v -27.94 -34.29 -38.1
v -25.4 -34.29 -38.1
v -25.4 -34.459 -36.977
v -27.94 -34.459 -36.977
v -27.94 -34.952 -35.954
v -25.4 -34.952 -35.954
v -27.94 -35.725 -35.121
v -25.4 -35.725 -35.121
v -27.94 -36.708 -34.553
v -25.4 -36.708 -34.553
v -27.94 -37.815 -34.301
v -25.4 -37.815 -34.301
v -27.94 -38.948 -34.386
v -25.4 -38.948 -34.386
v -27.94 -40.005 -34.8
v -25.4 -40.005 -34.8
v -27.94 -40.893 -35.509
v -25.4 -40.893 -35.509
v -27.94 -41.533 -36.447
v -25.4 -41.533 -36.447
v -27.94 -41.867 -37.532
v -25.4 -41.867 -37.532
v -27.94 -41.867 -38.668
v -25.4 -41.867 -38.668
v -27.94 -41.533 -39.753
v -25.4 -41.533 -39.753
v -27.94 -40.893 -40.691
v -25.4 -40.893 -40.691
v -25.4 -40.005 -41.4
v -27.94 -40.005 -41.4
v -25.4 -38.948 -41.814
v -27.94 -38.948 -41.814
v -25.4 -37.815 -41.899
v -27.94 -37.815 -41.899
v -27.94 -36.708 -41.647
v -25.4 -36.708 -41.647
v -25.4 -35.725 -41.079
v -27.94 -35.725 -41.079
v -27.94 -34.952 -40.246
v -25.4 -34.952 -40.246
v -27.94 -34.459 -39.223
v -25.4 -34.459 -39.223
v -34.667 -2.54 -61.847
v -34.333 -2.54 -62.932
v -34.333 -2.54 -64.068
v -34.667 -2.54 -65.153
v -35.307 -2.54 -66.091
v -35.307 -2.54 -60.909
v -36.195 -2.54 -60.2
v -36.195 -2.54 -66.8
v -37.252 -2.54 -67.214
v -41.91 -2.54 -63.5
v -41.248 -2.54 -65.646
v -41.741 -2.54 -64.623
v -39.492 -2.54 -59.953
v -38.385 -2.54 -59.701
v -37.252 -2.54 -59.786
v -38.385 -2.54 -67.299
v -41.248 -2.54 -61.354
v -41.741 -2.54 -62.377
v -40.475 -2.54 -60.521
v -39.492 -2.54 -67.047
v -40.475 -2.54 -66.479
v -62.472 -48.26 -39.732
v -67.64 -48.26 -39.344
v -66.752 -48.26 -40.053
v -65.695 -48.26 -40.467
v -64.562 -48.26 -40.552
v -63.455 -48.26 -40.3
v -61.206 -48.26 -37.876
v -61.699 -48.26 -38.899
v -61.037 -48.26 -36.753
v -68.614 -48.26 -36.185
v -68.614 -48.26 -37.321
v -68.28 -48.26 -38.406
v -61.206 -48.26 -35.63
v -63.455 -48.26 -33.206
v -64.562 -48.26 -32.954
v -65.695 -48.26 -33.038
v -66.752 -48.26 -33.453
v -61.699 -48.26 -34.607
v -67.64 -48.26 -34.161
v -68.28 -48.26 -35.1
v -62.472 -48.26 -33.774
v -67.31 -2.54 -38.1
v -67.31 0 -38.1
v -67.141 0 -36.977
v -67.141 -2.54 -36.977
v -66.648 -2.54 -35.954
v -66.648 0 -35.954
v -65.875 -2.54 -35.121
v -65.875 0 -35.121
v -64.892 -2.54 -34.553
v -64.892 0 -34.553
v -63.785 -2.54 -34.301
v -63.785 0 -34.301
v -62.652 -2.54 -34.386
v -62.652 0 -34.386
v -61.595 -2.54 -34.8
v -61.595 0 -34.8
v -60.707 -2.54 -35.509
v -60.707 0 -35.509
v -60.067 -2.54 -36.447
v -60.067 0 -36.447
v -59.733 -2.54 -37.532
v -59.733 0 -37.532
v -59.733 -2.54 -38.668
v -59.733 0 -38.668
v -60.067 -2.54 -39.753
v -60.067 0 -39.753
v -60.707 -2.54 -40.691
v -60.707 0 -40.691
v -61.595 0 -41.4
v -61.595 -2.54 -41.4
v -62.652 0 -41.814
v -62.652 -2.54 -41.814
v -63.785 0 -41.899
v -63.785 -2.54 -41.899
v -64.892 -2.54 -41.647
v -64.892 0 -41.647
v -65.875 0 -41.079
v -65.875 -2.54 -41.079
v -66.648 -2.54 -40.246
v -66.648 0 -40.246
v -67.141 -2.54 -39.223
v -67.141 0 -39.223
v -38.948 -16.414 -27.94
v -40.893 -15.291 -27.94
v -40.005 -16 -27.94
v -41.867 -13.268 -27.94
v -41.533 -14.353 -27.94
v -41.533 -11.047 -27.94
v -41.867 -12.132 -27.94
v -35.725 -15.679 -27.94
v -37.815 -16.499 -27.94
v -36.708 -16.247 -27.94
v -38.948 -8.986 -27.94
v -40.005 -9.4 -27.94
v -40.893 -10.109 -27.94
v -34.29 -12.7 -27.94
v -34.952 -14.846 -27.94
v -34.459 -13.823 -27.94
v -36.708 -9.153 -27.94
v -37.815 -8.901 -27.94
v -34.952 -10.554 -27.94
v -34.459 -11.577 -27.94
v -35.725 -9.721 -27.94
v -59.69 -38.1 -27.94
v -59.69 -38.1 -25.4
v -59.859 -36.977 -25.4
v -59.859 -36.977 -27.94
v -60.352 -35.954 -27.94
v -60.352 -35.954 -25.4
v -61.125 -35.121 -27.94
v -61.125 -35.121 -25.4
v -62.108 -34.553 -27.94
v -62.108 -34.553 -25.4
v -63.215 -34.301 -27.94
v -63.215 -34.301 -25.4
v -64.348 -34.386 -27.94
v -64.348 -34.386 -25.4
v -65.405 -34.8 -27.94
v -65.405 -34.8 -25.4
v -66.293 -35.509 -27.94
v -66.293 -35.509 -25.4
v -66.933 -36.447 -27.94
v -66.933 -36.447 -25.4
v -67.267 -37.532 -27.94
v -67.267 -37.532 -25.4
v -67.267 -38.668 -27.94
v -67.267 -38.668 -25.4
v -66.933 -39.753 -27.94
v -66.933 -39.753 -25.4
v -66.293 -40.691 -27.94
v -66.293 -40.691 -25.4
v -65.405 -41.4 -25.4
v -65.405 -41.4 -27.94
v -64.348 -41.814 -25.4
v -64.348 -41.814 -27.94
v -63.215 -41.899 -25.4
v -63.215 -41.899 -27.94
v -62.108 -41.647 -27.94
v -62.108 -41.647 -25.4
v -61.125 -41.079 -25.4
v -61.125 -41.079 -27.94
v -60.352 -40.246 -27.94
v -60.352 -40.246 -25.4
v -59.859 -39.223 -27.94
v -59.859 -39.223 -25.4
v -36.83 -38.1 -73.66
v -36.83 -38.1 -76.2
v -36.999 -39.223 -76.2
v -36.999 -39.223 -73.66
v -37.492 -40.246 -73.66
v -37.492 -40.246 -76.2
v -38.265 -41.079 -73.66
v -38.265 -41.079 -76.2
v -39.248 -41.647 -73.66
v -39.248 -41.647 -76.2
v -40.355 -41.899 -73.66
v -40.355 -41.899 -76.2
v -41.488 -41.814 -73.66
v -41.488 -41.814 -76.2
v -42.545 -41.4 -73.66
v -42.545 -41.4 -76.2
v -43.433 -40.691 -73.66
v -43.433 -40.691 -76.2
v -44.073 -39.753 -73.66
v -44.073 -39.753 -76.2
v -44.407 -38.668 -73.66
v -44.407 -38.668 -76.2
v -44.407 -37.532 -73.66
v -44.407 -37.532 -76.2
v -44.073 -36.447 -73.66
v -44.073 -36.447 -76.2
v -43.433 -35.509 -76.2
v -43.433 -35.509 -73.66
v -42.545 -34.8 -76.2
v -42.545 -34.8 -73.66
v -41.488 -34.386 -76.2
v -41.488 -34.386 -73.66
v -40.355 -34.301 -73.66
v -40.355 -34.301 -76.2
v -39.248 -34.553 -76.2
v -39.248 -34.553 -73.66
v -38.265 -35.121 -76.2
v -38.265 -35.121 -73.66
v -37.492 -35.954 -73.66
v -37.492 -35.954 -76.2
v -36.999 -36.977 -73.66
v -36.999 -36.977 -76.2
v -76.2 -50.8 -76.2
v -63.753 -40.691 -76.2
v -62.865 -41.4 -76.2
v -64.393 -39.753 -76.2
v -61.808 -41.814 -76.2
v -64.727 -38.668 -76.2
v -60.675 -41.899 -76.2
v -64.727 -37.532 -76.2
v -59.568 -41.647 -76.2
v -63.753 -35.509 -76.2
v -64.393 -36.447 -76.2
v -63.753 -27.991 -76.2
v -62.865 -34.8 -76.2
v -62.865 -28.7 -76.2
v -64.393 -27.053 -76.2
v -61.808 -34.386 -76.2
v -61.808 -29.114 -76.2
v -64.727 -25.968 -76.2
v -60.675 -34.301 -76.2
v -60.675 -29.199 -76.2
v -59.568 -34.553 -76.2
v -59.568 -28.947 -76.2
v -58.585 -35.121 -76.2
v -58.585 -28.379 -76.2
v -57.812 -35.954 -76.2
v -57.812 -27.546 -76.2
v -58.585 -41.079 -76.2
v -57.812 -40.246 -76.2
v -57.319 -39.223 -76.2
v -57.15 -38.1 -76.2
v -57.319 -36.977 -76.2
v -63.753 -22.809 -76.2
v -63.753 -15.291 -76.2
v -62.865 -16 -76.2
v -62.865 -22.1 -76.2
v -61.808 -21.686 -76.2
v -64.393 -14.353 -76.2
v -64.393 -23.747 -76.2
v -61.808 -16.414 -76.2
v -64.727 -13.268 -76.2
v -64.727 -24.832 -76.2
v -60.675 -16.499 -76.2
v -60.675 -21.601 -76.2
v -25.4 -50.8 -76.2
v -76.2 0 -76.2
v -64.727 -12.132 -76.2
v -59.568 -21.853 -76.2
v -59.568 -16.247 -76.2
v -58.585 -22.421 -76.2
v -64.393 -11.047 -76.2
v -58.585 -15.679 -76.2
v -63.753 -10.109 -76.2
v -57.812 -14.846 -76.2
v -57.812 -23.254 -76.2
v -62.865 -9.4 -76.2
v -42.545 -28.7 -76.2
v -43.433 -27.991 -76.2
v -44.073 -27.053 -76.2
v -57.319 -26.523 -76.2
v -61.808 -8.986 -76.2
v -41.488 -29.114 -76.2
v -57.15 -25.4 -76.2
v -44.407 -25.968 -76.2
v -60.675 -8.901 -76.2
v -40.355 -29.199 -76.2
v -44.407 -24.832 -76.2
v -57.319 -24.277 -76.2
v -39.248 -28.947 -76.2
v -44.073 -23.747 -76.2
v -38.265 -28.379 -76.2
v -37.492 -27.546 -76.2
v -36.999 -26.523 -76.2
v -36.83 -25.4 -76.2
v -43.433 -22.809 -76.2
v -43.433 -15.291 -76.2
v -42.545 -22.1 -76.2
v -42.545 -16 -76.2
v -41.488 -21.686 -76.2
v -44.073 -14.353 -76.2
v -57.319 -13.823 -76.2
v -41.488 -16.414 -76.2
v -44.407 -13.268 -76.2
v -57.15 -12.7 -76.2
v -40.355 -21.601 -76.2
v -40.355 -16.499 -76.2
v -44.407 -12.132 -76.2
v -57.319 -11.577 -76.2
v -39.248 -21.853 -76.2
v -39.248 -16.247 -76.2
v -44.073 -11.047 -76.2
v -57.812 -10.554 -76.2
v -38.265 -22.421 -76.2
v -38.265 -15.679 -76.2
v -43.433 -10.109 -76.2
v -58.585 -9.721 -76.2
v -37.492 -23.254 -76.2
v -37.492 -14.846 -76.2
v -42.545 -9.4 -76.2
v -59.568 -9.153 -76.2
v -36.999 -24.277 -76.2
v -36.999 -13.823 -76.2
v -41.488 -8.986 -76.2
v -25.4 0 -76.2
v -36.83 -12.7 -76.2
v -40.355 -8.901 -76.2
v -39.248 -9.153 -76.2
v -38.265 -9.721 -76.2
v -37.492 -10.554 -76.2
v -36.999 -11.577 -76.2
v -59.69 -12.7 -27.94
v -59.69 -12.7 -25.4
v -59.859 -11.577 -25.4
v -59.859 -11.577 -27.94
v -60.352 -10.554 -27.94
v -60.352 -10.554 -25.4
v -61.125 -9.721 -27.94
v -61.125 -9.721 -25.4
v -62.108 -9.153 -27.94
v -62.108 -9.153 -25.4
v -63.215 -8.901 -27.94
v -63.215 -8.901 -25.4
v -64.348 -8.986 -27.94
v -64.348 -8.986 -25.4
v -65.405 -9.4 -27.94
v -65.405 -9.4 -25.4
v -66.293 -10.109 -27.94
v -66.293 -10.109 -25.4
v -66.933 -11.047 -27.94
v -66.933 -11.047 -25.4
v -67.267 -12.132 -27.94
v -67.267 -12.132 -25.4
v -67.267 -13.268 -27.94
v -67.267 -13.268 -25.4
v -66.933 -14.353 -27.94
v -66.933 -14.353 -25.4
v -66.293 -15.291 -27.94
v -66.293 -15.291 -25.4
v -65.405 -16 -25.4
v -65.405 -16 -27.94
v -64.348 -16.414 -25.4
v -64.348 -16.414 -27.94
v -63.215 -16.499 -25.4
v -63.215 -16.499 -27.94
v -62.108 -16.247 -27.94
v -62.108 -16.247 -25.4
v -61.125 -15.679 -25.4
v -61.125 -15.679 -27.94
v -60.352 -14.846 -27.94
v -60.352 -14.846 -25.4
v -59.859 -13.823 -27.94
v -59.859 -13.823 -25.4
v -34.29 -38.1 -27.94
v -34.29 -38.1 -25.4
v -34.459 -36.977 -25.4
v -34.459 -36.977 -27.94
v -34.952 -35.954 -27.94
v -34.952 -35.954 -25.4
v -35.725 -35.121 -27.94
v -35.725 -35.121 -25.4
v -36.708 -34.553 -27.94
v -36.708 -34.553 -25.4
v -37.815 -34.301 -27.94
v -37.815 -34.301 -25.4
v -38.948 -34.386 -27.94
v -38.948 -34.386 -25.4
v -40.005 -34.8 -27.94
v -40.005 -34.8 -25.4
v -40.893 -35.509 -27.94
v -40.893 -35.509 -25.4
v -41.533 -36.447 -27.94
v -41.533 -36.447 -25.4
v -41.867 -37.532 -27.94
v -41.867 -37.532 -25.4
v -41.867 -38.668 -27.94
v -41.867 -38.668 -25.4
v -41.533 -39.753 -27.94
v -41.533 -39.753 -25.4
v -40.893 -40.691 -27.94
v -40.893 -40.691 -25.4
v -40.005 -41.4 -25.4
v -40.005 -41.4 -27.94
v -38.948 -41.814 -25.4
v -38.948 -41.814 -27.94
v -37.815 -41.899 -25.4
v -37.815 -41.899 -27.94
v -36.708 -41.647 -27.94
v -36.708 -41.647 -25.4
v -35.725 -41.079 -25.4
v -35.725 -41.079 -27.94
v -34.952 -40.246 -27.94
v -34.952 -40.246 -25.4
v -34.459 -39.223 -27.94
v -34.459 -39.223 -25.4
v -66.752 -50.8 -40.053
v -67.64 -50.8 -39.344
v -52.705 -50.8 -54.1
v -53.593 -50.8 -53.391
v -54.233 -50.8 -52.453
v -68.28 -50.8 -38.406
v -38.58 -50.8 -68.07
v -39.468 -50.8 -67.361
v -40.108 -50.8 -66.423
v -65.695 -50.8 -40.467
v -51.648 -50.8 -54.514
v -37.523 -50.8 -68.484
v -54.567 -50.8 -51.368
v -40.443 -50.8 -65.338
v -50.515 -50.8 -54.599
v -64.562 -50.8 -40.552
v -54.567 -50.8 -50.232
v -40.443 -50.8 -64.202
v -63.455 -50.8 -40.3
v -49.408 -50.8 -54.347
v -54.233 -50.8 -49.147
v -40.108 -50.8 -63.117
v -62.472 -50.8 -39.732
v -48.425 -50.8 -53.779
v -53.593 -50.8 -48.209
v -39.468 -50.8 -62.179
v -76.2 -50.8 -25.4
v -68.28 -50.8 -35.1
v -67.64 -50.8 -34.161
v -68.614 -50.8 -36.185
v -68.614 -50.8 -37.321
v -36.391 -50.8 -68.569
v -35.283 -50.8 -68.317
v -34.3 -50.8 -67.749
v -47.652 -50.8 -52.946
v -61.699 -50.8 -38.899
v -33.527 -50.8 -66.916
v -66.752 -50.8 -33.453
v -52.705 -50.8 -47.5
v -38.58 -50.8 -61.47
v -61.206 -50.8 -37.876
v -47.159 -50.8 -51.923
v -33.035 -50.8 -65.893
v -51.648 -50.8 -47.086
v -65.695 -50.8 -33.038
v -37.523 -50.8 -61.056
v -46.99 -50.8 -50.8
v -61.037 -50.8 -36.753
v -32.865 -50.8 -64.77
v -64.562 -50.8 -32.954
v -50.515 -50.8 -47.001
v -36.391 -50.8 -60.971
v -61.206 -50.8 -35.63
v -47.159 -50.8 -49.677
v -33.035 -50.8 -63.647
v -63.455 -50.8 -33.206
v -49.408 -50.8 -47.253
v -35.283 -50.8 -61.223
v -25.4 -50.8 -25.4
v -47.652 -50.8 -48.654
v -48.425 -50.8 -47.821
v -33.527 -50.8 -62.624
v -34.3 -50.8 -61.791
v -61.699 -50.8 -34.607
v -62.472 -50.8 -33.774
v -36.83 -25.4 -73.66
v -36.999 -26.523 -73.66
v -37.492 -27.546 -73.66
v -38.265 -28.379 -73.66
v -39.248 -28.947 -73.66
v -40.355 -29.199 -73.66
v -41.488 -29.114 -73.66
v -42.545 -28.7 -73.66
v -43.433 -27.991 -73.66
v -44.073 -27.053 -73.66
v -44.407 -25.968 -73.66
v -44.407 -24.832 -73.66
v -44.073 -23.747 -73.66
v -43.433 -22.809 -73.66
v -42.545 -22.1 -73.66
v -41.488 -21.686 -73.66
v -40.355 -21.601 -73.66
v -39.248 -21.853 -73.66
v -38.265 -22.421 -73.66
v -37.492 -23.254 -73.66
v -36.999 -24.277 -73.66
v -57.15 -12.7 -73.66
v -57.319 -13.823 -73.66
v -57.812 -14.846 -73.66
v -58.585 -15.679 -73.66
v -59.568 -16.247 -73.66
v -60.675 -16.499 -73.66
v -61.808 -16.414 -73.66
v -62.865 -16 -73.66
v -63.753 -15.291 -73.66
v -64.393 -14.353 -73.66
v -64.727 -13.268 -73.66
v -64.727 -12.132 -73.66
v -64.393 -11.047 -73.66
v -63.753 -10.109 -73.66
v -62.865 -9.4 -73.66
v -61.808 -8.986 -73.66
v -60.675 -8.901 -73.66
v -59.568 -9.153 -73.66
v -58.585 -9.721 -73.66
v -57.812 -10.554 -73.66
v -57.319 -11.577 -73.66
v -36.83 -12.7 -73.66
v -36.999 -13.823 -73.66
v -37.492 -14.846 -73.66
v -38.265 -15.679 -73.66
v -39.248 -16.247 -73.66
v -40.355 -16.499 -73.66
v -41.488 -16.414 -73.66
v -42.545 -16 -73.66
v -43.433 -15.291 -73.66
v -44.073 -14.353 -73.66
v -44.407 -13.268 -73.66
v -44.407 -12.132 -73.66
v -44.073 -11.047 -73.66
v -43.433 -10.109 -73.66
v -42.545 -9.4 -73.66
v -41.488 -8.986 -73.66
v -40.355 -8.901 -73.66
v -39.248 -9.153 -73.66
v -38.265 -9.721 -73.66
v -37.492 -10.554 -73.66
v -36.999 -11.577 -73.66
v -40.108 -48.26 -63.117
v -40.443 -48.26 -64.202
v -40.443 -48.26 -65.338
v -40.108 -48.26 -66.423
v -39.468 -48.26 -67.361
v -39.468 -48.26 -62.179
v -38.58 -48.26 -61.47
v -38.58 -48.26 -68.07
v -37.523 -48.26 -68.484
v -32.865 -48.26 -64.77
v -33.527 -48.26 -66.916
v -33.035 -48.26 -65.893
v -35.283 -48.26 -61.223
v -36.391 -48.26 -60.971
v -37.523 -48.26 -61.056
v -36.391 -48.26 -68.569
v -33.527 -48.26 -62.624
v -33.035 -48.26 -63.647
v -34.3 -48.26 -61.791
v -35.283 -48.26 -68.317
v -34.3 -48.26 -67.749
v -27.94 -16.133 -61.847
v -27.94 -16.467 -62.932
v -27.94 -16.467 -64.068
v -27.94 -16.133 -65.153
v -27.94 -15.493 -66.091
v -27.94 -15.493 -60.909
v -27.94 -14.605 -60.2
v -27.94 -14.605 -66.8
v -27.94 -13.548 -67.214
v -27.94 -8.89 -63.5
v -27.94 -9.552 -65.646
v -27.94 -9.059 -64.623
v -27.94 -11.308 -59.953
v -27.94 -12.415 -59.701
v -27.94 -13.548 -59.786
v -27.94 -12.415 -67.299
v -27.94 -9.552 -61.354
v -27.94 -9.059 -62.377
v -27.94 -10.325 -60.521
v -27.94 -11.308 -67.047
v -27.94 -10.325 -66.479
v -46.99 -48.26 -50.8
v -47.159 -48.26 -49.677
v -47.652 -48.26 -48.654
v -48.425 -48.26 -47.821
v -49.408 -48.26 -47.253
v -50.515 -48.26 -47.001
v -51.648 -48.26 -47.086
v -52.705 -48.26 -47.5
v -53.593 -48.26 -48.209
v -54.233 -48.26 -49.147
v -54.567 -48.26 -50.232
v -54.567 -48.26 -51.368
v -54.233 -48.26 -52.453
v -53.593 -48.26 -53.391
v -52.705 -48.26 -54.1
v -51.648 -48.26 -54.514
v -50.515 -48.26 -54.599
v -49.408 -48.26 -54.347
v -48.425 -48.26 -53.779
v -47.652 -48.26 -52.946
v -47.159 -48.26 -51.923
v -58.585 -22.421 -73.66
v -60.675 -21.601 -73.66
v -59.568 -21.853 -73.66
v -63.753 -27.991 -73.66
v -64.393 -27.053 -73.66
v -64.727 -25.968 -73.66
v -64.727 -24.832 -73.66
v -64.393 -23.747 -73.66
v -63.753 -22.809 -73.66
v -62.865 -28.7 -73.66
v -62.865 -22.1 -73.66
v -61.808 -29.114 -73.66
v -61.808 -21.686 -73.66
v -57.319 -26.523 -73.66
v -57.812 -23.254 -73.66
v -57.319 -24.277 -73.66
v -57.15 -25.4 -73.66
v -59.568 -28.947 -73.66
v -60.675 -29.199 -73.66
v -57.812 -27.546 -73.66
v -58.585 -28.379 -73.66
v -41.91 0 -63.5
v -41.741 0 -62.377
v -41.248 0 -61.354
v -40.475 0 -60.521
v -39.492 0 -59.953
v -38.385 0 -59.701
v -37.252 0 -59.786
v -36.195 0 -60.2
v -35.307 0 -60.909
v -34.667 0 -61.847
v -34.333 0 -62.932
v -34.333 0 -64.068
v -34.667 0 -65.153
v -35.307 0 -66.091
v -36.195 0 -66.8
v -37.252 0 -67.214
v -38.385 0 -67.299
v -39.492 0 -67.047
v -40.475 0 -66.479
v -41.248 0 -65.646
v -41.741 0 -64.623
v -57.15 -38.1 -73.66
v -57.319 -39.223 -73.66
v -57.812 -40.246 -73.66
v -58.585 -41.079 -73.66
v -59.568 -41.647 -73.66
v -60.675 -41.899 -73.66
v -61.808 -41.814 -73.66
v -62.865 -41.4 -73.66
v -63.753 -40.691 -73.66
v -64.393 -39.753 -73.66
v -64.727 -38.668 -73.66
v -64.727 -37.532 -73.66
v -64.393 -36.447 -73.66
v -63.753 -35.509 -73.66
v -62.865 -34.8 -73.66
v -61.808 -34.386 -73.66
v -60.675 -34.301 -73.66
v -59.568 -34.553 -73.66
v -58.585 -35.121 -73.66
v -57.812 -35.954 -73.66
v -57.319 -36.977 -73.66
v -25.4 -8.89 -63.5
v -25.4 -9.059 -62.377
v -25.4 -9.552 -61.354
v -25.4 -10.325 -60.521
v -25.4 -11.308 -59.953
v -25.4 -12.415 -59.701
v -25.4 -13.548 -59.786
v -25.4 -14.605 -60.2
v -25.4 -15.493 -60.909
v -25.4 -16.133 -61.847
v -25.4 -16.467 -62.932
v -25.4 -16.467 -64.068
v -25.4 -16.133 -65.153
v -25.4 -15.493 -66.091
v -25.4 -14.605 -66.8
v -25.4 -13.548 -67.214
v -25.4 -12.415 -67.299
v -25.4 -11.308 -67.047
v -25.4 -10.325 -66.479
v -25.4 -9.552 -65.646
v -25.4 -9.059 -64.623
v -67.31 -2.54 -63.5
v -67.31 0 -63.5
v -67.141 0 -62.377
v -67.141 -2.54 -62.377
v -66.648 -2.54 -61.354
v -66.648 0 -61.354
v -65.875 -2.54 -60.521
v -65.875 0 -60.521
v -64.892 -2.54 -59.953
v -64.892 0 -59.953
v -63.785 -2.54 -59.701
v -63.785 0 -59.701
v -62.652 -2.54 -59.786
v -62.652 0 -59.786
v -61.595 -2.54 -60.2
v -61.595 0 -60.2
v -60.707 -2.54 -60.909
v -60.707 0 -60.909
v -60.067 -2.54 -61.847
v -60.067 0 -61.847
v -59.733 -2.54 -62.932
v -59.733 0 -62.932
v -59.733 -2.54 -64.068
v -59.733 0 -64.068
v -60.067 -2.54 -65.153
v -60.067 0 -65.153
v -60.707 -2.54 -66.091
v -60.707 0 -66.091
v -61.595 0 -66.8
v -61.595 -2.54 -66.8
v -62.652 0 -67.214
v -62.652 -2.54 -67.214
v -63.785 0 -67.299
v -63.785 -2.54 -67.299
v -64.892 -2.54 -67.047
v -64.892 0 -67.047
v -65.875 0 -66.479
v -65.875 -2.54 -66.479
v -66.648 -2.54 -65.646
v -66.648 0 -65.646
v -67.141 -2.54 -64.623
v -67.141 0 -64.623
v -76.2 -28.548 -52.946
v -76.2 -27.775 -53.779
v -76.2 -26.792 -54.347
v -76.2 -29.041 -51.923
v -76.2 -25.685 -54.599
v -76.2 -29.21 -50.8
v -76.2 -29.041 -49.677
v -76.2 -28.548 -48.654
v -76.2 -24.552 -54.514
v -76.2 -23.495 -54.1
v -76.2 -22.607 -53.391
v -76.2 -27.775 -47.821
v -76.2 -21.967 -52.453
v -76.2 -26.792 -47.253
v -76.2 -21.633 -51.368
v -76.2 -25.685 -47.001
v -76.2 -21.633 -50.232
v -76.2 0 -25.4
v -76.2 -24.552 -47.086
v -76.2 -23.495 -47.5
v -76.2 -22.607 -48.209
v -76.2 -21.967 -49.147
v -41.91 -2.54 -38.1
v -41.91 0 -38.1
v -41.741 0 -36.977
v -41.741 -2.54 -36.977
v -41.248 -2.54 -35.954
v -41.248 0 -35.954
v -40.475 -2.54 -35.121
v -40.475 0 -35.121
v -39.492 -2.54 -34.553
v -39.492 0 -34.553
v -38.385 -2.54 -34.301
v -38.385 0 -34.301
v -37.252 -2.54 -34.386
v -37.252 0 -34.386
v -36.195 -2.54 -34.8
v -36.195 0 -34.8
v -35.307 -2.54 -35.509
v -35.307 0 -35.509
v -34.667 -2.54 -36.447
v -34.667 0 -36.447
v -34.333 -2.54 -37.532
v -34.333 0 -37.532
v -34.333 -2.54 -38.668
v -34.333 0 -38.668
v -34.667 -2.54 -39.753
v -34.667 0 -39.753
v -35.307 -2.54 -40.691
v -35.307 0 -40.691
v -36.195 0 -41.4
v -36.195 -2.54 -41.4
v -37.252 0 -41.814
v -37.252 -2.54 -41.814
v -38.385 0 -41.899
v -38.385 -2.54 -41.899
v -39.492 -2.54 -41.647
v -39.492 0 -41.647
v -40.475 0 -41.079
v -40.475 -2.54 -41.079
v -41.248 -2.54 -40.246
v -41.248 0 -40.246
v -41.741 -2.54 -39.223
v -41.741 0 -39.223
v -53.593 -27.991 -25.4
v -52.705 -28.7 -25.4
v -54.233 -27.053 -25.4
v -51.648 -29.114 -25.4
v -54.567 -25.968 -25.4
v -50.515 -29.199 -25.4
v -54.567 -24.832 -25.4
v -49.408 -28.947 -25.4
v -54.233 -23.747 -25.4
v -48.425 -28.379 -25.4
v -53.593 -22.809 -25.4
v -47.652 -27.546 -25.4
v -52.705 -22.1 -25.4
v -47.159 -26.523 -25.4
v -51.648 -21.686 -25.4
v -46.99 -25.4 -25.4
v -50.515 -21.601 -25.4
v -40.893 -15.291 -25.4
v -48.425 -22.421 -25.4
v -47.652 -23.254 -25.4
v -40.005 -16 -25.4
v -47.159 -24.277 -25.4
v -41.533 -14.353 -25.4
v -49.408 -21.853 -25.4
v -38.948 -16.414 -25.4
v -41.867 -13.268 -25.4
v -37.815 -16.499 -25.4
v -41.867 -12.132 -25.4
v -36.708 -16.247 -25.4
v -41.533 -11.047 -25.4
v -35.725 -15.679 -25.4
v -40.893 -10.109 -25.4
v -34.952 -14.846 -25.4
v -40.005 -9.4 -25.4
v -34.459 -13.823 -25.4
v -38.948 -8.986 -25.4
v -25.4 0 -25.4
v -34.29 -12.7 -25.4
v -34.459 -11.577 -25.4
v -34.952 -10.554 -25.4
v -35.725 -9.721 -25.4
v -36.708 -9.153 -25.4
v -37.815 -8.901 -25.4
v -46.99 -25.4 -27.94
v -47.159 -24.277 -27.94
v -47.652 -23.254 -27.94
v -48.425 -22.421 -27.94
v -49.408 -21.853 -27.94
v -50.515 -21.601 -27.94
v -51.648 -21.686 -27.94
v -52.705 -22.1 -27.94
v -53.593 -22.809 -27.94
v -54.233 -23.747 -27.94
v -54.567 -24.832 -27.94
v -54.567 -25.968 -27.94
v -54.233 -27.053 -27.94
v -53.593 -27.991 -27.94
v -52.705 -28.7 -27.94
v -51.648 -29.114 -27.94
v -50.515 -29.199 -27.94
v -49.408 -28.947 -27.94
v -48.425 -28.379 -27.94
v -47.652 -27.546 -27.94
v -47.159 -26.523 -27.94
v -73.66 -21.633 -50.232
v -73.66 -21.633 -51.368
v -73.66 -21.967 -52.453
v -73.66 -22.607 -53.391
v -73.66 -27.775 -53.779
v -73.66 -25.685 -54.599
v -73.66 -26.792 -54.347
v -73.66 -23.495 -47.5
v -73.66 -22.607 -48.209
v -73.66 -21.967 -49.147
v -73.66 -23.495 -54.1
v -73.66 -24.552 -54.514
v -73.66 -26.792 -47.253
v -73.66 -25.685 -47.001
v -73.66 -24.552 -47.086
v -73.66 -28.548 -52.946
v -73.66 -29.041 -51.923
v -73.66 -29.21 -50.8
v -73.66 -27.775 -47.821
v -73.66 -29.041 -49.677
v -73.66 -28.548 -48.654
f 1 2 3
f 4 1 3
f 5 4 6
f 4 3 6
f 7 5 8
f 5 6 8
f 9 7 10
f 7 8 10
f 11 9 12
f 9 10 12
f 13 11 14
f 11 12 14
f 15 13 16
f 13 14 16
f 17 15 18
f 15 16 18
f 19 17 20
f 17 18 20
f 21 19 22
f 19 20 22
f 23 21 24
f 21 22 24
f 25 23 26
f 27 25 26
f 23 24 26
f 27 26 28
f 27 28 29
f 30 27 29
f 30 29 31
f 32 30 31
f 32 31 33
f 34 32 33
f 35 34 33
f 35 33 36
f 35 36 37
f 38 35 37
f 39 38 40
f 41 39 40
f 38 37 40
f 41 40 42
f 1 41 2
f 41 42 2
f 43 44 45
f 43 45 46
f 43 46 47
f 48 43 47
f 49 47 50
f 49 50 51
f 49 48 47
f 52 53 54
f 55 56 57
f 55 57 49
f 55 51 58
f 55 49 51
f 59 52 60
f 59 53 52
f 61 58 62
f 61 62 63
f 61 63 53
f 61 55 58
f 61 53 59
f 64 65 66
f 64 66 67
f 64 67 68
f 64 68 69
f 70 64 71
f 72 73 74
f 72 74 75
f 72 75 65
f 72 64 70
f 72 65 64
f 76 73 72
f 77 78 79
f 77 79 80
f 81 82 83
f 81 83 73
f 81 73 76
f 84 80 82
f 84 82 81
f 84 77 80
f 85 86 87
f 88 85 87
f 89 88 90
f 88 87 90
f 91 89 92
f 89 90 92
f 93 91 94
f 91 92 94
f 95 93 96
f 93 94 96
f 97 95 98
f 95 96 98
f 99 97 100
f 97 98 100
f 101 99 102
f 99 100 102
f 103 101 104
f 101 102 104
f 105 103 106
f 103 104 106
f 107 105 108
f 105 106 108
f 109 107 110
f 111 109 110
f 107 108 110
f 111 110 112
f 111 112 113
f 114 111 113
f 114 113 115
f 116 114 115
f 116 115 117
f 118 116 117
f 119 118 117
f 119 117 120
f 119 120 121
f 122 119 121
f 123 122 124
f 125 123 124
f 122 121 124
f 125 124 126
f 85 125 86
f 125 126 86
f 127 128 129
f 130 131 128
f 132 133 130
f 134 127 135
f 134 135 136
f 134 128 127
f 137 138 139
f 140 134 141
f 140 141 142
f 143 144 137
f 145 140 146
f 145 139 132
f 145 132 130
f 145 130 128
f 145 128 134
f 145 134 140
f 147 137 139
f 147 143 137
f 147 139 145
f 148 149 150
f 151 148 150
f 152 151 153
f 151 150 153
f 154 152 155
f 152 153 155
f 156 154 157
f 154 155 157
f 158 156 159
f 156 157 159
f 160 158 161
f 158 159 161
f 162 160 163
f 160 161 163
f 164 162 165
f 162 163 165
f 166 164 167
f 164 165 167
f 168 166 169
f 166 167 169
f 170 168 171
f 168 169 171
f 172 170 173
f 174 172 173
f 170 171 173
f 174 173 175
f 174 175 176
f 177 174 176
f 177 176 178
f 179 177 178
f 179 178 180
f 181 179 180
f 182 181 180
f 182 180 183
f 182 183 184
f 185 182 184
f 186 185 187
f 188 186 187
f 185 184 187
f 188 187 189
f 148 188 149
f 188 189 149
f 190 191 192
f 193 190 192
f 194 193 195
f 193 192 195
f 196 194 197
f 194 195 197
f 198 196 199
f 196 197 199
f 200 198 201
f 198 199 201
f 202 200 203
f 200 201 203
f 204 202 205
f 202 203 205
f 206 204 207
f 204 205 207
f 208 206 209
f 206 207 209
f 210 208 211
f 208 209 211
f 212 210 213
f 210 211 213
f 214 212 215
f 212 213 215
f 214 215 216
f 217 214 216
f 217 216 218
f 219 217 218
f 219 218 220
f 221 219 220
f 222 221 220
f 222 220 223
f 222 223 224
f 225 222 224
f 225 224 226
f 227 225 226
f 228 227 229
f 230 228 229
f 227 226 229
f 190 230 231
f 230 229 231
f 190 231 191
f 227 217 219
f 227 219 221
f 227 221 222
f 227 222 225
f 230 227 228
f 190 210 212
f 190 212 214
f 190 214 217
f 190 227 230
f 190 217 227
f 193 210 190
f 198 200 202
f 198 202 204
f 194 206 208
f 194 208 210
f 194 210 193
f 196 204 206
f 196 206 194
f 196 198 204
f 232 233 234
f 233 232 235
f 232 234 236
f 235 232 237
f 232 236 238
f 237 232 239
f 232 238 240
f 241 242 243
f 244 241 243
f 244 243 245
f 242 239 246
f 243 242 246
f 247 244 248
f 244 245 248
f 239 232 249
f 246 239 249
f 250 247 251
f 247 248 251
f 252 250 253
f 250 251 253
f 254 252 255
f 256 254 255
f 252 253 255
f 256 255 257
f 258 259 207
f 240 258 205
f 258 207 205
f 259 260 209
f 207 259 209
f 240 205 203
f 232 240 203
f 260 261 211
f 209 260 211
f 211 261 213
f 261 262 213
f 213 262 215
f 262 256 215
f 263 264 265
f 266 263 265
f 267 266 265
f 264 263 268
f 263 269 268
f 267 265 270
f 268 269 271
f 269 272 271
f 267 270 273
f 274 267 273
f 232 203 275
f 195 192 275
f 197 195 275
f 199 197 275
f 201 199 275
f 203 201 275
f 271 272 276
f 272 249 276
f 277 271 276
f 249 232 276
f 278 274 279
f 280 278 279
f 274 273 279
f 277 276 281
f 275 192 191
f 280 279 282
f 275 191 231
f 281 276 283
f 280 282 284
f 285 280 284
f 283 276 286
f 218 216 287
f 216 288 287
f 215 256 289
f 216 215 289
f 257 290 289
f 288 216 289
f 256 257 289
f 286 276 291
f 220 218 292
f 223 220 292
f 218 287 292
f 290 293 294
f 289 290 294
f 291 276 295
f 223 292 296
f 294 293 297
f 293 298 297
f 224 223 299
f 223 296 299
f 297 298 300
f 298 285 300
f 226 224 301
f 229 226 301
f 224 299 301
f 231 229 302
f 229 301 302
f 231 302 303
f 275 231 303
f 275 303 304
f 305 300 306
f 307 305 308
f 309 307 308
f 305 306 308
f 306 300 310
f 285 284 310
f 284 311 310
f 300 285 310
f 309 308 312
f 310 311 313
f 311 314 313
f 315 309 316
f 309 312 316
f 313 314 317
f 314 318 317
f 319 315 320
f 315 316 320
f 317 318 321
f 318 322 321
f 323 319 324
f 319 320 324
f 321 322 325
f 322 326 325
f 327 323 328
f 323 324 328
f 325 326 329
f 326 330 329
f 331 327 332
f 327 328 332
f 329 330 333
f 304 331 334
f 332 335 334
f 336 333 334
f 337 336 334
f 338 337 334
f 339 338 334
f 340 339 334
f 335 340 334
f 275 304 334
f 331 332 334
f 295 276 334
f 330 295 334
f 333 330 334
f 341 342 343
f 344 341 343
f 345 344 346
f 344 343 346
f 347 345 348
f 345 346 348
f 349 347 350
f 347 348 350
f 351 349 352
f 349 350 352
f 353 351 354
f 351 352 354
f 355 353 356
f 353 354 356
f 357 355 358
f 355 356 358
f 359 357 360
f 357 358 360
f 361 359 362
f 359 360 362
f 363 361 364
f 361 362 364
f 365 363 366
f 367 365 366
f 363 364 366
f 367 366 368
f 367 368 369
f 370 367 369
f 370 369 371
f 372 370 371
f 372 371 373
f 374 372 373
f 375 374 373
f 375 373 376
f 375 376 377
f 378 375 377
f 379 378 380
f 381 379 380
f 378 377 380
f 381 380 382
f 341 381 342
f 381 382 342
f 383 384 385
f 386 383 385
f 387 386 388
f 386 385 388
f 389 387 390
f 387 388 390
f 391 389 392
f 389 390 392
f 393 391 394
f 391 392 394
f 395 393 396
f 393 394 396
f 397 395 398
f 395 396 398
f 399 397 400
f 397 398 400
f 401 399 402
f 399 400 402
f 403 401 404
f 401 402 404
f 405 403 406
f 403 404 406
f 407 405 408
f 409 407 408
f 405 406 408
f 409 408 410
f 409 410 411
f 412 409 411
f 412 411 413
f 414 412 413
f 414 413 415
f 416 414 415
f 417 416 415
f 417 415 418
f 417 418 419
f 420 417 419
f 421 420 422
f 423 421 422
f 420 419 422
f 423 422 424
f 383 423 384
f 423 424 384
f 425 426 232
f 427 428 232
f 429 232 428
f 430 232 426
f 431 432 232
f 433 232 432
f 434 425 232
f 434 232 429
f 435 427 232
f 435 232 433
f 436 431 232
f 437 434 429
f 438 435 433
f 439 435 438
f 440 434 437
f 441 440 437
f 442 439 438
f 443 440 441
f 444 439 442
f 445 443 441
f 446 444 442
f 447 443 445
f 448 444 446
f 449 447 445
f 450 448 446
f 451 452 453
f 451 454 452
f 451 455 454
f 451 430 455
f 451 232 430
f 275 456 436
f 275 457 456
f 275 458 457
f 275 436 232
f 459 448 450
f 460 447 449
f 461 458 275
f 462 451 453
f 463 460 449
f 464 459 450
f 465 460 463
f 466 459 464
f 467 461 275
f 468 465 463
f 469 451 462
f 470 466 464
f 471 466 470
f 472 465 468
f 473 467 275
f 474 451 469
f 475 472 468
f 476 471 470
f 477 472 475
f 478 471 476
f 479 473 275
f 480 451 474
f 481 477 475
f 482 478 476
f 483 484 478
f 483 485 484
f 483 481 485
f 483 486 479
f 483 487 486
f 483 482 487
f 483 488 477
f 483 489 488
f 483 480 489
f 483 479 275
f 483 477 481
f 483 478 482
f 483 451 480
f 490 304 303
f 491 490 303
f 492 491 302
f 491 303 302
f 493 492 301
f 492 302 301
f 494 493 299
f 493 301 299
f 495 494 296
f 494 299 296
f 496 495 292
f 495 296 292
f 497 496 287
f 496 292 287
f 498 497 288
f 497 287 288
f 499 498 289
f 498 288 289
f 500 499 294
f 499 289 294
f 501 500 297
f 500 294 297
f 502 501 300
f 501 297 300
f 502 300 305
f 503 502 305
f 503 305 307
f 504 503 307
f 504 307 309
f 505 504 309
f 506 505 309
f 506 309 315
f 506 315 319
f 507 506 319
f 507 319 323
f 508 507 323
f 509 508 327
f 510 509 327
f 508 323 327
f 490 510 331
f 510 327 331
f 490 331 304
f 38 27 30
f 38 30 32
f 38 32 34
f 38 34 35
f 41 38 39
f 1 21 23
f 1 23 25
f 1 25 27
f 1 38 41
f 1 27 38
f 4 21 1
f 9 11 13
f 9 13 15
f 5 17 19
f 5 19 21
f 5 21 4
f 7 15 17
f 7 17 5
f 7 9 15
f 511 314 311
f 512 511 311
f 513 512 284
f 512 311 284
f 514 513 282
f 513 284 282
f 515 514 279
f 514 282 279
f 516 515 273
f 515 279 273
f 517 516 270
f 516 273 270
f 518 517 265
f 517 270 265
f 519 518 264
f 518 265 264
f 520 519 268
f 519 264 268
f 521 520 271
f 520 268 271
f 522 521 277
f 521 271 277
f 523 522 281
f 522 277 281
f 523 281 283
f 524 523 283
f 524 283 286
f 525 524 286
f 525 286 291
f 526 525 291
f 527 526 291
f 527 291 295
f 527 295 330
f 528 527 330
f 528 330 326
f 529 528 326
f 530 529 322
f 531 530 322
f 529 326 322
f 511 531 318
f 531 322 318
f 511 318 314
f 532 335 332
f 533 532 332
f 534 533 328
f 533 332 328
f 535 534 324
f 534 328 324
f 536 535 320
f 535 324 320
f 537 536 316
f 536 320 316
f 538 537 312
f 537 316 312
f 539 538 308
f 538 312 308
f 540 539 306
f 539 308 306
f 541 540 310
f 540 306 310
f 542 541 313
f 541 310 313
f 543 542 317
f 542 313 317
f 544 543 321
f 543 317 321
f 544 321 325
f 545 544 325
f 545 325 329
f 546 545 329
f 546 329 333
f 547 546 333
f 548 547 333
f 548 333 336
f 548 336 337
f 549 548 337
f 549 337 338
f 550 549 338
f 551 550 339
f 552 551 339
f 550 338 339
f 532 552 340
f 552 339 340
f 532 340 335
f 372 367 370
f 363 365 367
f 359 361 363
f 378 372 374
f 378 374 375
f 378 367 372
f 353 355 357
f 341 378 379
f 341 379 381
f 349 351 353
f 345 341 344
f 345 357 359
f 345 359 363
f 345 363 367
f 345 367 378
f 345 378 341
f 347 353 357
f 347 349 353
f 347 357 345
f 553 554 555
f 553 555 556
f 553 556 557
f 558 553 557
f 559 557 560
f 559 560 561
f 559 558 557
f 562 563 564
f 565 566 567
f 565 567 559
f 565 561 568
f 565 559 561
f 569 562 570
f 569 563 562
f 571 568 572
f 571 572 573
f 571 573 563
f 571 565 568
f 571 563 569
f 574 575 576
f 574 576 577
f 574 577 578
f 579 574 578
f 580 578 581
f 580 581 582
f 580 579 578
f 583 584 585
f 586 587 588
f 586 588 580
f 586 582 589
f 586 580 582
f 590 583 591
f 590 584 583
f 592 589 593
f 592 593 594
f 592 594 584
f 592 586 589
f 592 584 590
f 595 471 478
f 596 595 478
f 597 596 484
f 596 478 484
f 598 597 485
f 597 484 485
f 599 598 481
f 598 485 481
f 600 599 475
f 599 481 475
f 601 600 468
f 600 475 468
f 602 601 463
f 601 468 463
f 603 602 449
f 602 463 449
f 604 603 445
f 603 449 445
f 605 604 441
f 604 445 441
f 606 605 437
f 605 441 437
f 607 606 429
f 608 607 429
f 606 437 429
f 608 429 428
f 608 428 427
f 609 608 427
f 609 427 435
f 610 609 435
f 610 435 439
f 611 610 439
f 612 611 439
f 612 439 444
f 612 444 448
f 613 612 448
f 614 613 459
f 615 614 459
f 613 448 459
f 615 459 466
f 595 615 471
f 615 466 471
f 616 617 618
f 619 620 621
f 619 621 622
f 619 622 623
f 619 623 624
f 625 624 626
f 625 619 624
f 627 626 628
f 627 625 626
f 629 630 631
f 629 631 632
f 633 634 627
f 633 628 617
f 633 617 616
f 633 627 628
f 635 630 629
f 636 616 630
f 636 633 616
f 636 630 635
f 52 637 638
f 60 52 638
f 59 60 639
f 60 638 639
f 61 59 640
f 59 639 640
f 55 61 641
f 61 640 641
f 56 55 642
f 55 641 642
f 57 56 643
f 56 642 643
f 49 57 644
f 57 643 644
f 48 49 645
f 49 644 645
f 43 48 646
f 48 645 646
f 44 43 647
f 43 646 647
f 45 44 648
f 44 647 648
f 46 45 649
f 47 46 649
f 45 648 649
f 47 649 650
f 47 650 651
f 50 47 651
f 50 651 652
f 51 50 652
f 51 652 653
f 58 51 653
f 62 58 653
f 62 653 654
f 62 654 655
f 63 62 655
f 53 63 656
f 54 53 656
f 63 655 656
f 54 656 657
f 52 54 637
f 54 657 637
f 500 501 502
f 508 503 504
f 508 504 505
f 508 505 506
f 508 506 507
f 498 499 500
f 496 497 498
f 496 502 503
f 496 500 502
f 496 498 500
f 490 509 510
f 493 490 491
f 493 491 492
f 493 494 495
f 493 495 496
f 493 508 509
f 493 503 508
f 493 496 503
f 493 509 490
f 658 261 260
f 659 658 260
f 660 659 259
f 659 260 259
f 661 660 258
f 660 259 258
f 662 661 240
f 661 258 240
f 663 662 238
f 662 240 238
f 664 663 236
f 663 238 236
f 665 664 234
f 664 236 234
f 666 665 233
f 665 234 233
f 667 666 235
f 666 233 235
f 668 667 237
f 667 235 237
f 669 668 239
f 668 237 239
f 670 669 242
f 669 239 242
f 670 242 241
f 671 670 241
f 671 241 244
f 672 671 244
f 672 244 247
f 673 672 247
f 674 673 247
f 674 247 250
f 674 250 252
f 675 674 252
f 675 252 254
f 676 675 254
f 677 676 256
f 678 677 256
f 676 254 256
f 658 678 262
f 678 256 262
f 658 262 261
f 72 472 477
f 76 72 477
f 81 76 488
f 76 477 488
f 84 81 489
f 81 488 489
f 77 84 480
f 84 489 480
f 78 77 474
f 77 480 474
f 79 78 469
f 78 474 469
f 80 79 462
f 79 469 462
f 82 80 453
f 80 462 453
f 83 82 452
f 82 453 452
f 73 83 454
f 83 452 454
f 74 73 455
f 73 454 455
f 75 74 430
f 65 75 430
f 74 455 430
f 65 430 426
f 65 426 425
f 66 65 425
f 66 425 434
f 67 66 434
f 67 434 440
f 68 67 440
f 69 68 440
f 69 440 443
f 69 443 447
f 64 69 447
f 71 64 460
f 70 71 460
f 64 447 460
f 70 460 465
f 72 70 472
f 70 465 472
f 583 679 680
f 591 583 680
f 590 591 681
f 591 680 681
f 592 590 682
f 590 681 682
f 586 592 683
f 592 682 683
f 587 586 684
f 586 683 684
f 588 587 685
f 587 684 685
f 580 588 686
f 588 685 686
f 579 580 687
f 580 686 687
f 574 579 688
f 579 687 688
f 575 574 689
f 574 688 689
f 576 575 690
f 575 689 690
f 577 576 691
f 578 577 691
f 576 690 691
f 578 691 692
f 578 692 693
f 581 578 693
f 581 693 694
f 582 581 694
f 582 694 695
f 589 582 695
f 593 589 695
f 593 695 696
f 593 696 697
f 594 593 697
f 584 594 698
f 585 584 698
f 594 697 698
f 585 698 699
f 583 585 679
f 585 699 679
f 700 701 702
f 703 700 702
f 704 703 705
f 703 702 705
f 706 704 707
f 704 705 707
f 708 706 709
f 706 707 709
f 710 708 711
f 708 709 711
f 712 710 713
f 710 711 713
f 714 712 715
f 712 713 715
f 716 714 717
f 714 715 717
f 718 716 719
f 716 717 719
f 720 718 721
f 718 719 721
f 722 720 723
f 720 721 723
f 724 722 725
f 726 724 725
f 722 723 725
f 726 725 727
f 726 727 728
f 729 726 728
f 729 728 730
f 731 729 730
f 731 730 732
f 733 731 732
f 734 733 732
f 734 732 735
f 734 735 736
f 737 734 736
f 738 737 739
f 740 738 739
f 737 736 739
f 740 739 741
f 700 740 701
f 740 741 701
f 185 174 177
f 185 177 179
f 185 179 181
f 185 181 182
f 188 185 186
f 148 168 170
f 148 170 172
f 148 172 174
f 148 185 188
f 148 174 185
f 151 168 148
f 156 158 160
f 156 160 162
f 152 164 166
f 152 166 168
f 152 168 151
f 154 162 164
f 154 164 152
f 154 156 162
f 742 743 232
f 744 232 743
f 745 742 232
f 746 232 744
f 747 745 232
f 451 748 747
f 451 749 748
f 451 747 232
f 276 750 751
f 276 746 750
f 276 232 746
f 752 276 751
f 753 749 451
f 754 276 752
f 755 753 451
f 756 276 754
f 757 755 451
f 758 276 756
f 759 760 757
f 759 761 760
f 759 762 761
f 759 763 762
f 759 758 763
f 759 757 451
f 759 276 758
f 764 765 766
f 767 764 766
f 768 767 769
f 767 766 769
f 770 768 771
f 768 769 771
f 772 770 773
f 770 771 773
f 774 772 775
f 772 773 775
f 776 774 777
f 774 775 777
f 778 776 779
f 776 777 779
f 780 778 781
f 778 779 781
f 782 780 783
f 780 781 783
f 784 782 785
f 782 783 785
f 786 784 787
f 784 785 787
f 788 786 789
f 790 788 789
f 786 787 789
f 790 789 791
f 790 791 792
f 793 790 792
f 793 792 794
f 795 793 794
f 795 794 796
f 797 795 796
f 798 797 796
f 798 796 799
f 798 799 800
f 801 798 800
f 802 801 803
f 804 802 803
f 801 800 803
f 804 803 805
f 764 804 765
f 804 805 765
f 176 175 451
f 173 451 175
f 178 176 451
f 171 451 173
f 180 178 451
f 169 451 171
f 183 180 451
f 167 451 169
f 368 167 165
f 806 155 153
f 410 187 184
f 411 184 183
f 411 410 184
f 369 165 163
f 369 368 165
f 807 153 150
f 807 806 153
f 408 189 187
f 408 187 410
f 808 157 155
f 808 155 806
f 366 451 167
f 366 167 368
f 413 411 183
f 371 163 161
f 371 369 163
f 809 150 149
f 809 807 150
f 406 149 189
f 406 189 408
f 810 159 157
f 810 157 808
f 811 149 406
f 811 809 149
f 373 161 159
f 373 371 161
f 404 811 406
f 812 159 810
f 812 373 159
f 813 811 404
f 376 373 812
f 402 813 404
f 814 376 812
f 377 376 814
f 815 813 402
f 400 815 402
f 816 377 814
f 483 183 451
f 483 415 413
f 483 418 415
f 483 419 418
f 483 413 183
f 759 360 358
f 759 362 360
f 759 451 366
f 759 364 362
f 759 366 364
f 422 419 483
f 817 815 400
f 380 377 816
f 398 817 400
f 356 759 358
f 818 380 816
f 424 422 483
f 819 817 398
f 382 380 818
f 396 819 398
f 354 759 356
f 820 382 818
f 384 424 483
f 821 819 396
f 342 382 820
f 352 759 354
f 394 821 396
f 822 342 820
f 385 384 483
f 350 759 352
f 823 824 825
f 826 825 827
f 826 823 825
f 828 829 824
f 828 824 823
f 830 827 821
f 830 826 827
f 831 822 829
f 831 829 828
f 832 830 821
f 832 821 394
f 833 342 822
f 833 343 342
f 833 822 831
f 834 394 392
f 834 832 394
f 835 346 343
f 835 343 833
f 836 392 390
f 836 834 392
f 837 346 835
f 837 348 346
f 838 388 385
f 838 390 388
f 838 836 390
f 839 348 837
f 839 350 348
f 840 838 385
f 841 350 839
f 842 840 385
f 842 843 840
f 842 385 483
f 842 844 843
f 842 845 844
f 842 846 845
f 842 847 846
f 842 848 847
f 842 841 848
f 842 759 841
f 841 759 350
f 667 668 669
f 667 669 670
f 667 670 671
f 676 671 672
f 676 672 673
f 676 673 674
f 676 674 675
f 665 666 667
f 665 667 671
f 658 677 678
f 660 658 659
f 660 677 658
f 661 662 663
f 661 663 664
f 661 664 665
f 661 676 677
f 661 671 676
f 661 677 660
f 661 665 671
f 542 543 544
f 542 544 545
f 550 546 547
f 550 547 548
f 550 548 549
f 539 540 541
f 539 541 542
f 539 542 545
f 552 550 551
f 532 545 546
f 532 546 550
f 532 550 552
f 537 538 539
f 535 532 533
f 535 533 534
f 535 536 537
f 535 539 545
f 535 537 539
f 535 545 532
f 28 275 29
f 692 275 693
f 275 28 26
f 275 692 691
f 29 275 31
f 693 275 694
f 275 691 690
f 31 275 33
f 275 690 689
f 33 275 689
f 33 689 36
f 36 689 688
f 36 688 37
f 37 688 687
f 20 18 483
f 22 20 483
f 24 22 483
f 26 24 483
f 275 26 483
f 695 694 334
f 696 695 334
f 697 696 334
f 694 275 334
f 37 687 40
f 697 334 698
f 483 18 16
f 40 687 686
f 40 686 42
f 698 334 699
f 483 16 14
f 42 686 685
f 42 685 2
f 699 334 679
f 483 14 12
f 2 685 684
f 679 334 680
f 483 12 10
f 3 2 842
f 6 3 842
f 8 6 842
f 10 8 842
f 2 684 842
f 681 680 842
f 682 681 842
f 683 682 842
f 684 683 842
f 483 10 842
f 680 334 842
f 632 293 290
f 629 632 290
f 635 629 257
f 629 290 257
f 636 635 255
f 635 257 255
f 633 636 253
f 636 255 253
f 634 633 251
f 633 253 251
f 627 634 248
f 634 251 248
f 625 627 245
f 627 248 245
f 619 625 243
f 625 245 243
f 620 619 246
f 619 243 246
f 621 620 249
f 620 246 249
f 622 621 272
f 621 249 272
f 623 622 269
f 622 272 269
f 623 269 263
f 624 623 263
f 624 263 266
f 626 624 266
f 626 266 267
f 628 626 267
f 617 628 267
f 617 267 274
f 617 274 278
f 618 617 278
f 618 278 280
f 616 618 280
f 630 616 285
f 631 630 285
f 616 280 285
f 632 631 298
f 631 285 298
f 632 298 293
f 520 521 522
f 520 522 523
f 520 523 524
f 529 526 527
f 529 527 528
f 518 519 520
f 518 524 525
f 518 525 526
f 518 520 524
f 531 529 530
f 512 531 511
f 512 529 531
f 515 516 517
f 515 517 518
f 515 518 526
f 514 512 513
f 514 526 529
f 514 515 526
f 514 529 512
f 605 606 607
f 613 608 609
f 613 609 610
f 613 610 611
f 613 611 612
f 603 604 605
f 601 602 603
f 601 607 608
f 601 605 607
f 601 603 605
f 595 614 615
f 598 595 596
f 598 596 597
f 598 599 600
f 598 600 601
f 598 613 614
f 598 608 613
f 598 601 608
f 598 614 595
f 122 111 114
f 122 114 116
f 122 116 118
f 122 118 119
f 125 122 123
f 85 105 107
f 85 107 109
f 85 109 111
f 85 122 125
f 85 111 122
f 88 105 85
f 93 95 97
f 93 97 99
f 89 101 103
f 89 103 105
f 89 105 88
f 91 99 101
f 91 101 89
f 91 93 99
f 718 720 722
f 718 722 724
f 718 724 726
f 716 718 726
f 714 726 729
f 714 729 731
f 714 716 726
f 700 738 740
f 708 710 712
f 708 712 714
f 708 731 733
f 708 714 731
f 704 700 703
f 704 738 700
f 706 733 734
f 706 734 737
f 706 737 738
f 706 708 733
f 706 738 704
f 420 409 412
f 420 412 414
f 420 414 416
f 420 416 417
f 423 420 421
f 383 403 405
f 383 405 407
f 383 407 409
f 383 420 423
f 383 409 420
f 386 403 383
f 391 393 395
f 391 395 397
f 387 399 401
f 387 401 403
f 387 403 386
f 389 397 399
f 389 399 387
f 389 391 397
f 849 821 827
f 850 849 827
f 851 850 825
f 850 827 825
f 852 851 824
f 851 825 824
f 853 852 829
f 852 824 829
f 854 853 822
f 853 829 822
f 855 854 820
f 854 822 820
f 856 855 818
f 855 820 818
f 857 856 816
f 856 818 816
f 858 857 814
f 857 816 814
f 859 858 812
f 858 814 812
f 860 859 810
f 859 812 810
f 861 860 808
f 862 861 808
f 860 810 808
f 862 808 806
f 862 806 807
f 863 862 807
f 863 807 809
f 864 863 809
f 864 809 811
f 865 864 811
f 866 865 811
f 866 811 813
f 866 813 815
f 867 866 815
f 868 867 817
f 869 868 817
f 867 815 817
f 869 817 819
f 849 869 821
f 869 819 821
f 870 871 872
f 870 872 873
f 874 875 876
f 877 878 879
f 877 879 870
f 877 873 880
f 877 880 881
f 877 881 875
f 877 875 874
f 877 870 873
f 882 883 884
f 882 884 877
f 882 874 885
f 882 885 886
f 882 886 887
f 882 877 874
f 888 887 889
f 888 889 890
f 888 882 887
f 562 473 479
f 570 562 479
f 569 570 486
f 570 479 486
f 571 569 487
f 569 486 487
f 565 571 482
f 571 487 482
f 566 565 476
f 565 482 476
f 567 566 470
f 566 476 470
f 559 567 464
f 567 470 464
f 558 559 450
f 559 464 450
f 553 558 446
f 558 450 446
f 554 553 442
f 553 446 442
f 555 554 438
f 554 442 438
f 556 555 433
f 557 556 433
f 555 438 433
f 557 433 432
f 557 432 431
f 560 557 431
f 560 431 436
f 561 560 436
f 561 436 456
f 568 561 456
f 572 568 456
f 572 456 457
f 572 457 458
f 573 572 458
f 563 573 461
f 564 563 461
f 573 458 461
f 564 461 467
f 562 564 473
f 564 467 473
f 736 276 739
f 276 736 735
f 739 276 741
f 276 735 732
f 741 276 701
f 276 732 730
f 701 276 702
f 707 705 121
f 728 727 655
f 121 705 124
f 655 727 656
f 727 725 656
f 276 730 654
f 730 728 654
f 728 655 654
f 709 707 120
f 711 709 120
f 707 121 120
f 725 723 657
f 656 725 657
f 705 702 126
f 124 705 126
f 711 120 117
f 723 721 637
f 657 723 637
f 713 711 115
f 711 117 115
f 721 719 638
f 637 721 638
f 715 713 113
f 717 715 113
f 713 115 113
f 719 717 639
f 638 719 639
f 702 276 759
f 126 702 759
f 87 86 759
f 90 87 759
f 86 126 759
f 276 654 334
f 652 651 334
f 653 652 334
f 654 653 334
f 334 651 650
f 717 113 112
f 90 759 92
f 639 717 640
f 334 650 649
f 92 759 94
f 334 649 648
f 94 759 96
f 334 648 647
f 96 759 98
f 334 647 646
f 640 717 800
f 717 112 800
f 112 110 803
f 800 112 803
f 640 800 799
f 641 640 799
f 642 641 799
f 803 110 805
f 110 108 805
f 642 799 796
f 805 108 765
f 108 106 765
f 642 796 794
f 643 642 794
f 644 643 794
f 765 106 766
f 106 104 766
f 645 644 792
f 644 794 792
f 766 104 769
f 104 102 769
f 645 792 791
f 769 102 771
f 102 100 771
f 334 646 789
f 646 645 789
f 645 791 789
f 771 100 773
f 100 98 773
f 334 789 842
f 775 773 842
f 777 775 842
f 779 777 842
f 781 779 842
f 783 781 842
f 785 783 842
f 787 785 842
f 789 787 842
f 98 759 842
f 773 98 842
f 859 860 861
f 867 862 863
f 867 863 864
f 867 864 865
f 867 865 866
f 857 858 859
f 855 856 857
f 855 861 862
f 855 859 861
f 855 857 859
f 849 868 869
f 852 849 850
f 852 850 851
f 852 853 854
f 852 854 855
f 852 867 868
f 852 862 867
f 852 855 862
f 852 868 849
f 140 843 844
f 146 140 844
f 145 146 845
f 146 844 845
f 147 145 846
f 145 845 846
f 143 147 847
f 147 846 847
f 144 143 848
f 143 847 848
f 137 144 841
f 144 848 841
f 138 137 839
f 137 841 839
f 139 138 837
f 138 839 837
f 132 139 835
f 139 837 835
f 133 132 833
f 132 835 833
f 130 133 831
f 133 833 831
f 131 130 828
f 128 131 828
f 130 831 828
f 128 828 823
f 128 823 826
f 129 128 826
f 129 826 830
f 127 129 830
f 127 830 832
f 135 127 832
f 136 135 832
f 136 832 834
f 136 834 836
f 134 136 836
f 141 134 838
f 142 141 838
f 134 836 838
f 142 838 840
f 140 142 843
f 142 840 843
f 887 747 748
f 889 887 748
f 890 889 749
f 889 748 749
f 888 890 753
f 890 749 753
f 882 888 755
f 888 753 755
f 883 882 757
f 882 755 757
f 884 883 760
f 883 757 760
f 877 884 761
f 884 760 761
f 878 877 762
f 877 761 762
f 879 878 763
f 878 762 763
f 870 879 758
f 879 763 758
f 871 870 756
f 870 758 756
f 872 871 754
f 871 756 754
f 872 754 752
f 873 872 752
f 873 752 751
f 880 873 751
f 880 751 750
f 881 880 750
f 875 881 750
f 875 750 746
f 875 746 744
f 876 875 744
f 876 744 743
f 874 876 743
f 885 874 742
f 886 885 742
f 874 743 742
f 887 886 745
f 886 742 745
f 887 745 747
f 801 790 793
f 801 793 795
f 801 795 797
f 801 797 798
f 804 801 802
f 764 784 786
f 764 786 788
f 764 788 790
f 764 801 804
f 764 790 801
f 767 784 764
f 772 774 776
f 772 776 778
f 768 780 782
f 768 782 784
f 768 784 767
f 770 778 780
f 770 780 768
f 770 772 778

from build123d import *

# Parameters (mm, degrees)
F0_W      = 50.8
F0_H      = 50.8
F1_DEPTH  = 50.8
F2_R      = 3.81
F3_DEPTH  = 2.54
F4_R      = 3.81
F5_DEPTH  = 2.54
F6_R      = 3.81
F7_DEPTH  = 2.54
F8_R      = 3.81
F9_DEPTH  = 2.54
F10_R     = 3.81
F11_DEPTH = 2.54
F12_R     = 3.81
F13_DEPTH = 2.54


with BuildPart() as f1:
    # F0 (on Front) → F1 (new body)
    with BuildSketch(Plane.XZ):
        with Locations((-50.8, -50.8)):
            Rectangle(F0_W, F0_H)
    extrude(amount=F1_DEPTH)

    # F2 (on face) → F3 (cut)
    with BuildSketch(Plane(origin=(-76.2, 0, 0), x_dir=(0, -1, 0), z_dir=(-1, 0, 0))):
        with Locations((25.4, -50.8)):
            Circle(F2_R)
    extrude(amount=-F3_DEPTH, mode=Mode.SUBTRACT)

    # F4 (on face) → F5 (cut)
    with BuildSketch(Plane.YZ.offset(-25.4)):
        with Locations((-12.7, -63.5)):
            Circle(F4_R)
        with Locations((-38.1, -38.1)):
            Circle(F4_R)
    extrude(amount=-F5_DEPTH, mode=Mode.SUBTRACT)

    # F6 (on face) → F7 (cut)
    with BuildSketch(Plane.XZ.offset(50.8)):
        with Locations((-50.8, -50.8)):
            Circle(F6_R)
        with Locations((-64.847043, -36.752957)):
            Circle(F6_R)
        with Locations((-36.675387, -64.77)):
            Circle(F6_R)
    extrude(amount=-F7_DEPTH, mode=Mode.SUBTRACT)

    # F8 (on face) → F9 (cut)
    with BuildSketch(Plane(origin=(0, 0, 0), x_dir=(-1, 0, 0), z_dir=(0, 1, 0))):
        with Locations((38.1, -38.1)):
            Circle(F8_R)
        with Locations((63.5, -38.1)):
            Circle(F8_R)
        with Locations((38.1, -63.5)):
            Circle(F8_R)
        with Locations((63.5, -63.5)):
            Circle(F8_R)
    extrude(amount=-F9_DEPTH, mode=Mode.SUBTRACT)

    # F10 (on face) → F11 (cut)
    with BuildSketch(Plane.XY.offset(-25.4)):
        with Locations((-63.5, -12.7)):
            Circle(F10_R)
        with Locations((-38.1, -12.7)):
            Circle(F10_R)
        with Locations((-63.5, -38.1)):
            Circle(F10_R)
        with Locations((-38.1, -38.1)):
            Circle(F10_R)
        with Locations((-50.8, -25.4)):
            Circle(F10_R)
    extrude(amount=-F11_DEPTH, mode=Mode.SUBTRACT)

    # F12 (on face) → F13 (cut)
    with BuildSketch(Plane(origin=(0, 0, -76.2), x_dir=(1, 0, 0), z_dir=(0, 0, -1))):
        with Locations((-60.96, 25.4)):
            Circle(F12_R)
        with Locations((-60.96, 38.1)):
            Circle(F12_R)
        with Locations((-60.96, 12.7)):
            Circle(F12_R)
        with Locations((-40.64, 12.7)):
            Circle(F12_R)
        with Locations((-40.64, 25.4)):
            Circle(F12_R)
        with Locations((-40.64, 38.1)):
            Circle(F12_R)
    extrude(amount=-F13_DEPTH, mode=Mode.SUBTRACT)


solid = f1.part
